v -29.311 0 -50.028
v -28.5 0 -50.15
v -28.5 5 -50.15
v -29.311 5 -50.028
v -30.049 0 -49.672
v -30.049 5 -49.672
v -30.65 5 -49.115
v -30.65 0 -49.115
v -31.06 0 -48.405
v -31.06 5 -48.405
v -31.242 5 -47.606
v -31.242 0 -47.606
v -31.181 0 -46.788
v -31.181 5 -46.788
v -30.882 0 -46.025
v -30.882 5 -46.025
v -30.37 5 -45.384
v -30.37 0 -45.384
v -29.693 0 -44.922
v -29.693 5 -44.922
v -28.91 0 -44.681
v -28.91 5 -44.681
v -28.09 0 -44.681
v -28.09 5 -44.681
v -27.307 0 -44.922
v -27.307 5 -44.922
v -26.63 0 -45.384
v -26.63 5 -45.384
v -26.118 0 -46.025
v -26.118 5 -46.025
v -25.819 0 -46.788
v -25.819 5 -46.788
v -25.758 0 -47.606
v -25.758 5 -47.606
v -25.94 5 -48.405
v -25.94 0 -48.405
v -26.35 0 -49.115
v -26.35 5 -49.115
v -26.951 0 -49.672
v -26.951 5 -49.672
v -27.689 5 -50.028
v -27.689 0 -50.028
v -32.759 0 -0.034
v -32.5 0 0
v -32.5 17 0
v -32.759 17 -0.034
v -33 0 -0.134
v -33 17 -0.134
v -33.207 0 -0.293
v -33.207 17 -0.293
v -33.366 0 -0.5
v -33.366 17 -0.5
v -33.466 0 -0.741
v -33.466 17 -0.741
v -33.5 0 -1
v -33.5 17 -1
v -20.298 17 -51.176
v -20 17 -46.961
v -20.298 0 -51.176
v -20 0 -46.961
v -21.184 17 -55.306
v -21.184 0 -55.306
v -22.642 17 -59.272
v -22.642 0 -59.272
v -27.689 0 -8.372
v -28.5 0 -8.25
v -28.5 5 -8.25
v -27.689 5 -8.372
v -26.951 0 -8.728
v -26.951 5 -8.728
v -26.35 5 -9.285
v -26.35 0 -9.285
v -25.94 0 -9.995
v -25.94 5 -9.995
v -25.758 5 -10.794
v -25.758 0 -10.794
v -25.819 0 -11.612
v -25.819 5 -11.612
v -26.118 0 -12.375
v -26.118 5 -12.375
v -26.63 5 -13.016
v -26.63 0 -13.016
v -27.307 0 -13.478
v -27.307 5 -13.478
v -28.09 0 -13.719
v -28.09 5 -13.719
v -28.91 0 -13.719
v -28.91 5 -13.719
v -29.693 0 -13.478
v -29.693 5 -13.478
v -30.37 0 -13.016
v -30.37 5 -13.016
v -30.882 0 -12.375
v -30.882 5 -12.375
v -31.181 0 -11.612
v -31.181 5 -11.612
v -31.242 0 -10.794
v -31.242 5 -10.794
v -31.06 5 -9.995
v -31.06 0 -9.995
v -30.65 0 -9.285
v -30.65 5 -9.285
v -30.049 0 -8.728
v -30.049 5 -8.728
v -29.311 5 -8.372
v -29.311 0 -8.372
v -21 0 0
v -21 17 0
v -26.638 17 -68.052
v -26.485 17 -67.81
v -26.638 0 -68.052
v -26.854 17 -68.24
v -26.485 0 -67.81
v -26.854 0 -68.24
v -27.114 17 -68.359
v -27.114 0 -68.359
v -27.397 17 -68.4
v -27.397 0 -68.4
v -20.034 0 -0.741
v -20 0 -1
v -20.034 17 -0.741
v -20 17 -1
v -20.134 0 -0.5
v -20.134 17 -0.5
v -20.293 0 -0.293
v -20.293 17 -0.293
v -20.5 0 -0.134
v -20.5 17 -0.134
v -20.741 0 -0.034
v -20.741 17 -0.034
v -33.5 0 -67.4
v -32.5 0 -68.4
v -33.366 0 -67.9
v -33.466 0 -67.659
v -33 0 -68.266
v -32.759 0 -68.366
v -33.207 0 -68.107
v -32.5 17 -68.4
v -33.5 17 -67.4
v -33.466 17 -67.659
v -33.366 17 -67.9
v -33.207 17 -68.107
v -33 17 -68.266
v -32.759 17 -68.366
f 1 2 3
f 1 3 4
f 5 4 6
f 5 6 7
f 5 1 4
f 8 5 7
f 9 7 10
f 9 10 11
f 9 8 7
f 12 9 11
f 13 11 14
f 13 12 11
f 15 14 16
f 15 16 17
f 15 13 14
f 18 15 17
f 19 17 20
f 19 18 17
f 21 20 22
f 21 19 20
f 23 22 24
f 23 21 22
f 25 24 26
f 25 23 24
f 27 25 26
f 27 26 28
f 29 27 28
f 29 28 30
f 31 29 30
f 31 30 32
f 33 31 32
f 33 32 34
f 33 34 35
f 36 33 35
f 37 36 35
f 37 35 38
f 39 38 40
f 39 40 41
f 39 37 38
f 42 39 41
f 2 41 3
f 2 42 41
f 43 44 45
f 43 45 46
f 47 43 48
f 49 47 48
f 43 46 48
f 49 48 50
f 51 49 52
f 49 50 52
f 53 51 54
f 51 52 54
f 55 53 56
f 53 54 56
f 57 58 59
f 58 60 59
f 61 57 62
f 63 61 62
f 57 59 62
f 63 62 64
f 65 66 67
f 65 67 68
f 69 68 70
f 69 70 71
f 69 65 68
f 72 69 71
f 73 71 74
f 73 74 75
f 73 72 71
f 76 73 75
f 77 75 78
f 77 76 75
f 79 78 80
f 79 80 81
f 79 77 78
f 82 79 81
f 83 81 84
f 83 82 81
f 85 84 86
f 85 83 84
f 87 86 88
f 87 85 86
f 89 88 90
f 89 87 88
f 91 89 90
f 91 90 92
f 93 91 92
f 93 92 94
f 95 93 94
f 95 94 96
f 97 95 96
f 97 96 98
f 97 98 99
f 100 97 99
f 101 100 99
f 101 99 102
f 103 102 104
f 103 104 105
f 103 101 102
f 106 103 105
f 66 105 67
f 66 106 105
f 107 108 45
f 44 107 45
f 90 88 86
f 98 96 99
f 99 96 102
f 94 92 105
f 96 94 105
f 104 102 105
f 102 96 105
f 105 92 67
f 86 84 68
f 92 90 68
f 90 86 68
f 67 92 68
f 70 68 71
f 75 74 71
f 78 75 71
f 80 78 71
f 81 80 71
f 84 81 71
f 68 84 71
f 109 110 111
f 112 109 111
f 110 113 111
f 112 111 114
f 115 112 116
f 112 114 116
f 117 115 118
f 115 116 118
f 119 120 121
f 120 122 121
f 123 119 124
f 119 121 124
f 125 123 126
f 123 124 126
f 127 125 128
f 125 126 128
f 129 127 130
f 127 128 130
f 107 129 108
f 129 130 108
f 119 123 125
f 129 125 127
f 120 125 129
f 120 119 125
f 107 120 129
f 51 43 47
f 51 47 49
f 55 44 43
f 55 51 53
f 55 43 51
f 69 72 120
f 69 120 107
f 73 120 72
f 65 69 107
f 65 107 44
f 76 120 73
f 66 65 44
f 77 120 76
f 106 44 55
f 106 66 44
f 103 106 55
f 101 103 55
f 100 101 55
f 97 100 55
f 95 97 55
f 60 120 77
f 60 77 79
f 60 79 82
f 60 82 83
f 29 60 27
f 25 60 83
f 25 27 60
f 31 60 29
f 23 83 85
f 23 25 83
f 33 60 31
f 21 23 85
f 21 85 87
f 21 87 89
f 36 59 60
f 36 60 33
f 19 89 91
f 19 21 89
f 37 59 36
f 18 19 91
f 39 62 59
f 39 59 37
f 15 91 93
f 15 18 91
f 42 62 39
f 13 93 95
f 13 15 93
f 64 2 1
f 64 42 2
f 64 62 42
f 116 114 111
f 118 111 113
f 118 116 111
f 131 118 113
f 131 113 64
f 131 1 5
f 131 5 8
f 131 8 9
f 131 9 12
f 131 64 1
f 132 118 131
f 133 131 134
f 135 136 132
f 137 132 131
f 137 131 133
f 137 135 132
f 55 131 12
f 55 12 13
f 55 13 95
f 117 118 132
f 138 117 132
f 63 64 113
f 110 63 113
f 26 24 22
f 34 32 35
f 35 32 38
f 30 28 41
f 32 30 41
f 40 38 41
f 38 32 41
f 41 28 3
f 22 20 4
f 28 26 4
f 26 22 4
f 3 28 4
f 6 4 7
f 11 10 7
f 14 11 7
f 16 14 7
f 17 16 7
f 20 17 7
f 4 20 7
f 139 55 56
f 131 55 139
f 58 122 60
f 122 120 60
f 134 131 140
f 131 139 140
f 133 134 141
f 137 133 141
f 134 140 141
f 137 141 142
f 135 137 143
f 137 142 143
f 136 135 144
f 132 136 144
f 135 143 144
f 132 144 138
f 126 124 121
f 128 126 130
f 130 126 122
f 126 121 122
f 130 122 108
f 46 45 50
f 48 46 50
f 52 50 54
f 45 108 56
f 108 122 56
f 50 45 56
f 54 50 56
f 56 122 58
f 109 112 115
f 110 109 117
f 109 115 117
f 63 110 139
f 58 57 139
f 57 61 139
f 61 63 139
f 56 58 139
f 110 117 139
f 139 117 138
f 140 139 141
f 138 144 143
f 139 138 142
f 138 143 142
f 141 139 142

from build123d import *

# Parameters (mm, degrees)
SKETCH_1_W          = 13.5
SKETCH_1_H          = 68.4
EXTRUDE_1_DEPTH     = 17
SKETCH_2_R          = 2.75
CUT_EXTRUDE_1_DEPTH = 5
CUT_EXTRUDE_2_DEPTH = 17
EXTRUDE_2_DEPTH     = 5.5
SKETCH_11_W         = 4
SKETCH_11_H         = 20
CUT_EXTRUDE_7_DEPTH = 17
FILLET_1_R          = 30
FILLET_2_R          = 1
SKETCH_7_W          = 30
SKETCH_7_H          = 69.053295448
CUT_EXTRUDE_4_DEPTH = 17


with BuildPart() as part:
    # ｽｹｯﾁ1 → ﾎﾞｽ - 押し出し1 (new body)
    with BuildSketch(Plane(origin=(0, 0, 0), x_dir=(1, 0, 0), z_dir=(0, 1, 0))):
        with Locations((6.75, 34.2)):
            Rectangle(SKETCH_1_W, SKETCH_1_H)
    extrude(amount=EXTRUDE_1_DEPTH)

    # ｽｹｯﾁ2 → ｶｯﾄ - 押し出し1 (cut)
    with BuildSketch(Plane.XZ):
        with Locations(Location((8.5, -47.4, 0), (0, 0, 270))):
            Circle(SKETCH_2_R)
        with Locations(Location((8.5, -11, 0), (0, 0, 90))):
            Circle(SKETCH_2_R)
    extrude(amount=-CUT_EXTRUDE_1_DEPTH, mode=Mode.SUBTRACT)

    # ｽｹｯﾁ3 → ｶｯﾄ - 押し出し2 (cut)
    with BuildSketch(Plane(origin=(0, 17, 0), x_dir=(1, 0, 0), z_dir=(0, 1, 0))):
        Polygon((6.75, 68.4), (0, 68.4), (0, 53.4), align=None)
    extrude(amount=-CUT_EXTRUDE_2_DEPTH, mode=Mode.SUBTRACT)

    # ｽｹｯﾁ4 → ﾎﾞｽ - 押し出し2 (add)
    with BuildSketch(Plane.XZ):
        Polygon((0, -47), (-4, -37), (-4, -27), (0, -27), align=None)
    extrude(amount=-EXTRUDE_2_DEPTH)

    # ｽｹｯﾁ11 → ｶｯﾄ - 押し出し7 (cut)
    with BuildSketch(Plane(origin=(0, 17, 0), x_dir=(1, 0, 0), z_dir=(0, 1, 0))):
        with Locations((-2, 37)):
            Rectangle(SKETCH_11_W, SKETCH_11_H)
    extrude(amount=-CUT_EXTRUDE_7_DEPTH, mode=Mode.SUBTRACT)

    # ﾌｨﾚｯﾄ1
    fillet_1_edges = [part.edges().sort_by_distance(p)[0] for p in [
        (0, 8.5, -53.4),
    ]]
    fillet(fillet_1_edges, radius=FILLET_1_R)

    # ﾌｨﾚｯﾄ2
    fillet_2_edges = [part.edges().sort_by_distance(p)[0] for p in [
        (6.75, 8.5, -68.4),
        (13.5, 8.5, -68.4),
        (13.5, 8.5, 0),
        (0, 8.5, 0),
    ]]
    fillet(fillet_2_edges, radius=FILLET_2_R)


with BuildPart() as body_2:
    # ﾐﾗｰ1: mirrored copy
    add(part.part.mirror(Plane.ZY.offset(10)))


with BuildPart() as part_1:
    add(part.part)

    # ｽｹｯﾁ7 → ｶｯﾄ - 押し出し4 (cut)
    with BuildSketch(Plane(origin=(0, 17, 0), x_dir=(1, 0, 0), z_dir=(0, 1, 0))):
        with Locations((-1.5, 34.526647724)):
            Rectangle(SKETCH_7_W, SKETCH_7_H)
    extrude(amount=-CUT_EXTRUDE_4_DEPTH, mode=Mode.SUBTRACT)


solid = body_2.part
